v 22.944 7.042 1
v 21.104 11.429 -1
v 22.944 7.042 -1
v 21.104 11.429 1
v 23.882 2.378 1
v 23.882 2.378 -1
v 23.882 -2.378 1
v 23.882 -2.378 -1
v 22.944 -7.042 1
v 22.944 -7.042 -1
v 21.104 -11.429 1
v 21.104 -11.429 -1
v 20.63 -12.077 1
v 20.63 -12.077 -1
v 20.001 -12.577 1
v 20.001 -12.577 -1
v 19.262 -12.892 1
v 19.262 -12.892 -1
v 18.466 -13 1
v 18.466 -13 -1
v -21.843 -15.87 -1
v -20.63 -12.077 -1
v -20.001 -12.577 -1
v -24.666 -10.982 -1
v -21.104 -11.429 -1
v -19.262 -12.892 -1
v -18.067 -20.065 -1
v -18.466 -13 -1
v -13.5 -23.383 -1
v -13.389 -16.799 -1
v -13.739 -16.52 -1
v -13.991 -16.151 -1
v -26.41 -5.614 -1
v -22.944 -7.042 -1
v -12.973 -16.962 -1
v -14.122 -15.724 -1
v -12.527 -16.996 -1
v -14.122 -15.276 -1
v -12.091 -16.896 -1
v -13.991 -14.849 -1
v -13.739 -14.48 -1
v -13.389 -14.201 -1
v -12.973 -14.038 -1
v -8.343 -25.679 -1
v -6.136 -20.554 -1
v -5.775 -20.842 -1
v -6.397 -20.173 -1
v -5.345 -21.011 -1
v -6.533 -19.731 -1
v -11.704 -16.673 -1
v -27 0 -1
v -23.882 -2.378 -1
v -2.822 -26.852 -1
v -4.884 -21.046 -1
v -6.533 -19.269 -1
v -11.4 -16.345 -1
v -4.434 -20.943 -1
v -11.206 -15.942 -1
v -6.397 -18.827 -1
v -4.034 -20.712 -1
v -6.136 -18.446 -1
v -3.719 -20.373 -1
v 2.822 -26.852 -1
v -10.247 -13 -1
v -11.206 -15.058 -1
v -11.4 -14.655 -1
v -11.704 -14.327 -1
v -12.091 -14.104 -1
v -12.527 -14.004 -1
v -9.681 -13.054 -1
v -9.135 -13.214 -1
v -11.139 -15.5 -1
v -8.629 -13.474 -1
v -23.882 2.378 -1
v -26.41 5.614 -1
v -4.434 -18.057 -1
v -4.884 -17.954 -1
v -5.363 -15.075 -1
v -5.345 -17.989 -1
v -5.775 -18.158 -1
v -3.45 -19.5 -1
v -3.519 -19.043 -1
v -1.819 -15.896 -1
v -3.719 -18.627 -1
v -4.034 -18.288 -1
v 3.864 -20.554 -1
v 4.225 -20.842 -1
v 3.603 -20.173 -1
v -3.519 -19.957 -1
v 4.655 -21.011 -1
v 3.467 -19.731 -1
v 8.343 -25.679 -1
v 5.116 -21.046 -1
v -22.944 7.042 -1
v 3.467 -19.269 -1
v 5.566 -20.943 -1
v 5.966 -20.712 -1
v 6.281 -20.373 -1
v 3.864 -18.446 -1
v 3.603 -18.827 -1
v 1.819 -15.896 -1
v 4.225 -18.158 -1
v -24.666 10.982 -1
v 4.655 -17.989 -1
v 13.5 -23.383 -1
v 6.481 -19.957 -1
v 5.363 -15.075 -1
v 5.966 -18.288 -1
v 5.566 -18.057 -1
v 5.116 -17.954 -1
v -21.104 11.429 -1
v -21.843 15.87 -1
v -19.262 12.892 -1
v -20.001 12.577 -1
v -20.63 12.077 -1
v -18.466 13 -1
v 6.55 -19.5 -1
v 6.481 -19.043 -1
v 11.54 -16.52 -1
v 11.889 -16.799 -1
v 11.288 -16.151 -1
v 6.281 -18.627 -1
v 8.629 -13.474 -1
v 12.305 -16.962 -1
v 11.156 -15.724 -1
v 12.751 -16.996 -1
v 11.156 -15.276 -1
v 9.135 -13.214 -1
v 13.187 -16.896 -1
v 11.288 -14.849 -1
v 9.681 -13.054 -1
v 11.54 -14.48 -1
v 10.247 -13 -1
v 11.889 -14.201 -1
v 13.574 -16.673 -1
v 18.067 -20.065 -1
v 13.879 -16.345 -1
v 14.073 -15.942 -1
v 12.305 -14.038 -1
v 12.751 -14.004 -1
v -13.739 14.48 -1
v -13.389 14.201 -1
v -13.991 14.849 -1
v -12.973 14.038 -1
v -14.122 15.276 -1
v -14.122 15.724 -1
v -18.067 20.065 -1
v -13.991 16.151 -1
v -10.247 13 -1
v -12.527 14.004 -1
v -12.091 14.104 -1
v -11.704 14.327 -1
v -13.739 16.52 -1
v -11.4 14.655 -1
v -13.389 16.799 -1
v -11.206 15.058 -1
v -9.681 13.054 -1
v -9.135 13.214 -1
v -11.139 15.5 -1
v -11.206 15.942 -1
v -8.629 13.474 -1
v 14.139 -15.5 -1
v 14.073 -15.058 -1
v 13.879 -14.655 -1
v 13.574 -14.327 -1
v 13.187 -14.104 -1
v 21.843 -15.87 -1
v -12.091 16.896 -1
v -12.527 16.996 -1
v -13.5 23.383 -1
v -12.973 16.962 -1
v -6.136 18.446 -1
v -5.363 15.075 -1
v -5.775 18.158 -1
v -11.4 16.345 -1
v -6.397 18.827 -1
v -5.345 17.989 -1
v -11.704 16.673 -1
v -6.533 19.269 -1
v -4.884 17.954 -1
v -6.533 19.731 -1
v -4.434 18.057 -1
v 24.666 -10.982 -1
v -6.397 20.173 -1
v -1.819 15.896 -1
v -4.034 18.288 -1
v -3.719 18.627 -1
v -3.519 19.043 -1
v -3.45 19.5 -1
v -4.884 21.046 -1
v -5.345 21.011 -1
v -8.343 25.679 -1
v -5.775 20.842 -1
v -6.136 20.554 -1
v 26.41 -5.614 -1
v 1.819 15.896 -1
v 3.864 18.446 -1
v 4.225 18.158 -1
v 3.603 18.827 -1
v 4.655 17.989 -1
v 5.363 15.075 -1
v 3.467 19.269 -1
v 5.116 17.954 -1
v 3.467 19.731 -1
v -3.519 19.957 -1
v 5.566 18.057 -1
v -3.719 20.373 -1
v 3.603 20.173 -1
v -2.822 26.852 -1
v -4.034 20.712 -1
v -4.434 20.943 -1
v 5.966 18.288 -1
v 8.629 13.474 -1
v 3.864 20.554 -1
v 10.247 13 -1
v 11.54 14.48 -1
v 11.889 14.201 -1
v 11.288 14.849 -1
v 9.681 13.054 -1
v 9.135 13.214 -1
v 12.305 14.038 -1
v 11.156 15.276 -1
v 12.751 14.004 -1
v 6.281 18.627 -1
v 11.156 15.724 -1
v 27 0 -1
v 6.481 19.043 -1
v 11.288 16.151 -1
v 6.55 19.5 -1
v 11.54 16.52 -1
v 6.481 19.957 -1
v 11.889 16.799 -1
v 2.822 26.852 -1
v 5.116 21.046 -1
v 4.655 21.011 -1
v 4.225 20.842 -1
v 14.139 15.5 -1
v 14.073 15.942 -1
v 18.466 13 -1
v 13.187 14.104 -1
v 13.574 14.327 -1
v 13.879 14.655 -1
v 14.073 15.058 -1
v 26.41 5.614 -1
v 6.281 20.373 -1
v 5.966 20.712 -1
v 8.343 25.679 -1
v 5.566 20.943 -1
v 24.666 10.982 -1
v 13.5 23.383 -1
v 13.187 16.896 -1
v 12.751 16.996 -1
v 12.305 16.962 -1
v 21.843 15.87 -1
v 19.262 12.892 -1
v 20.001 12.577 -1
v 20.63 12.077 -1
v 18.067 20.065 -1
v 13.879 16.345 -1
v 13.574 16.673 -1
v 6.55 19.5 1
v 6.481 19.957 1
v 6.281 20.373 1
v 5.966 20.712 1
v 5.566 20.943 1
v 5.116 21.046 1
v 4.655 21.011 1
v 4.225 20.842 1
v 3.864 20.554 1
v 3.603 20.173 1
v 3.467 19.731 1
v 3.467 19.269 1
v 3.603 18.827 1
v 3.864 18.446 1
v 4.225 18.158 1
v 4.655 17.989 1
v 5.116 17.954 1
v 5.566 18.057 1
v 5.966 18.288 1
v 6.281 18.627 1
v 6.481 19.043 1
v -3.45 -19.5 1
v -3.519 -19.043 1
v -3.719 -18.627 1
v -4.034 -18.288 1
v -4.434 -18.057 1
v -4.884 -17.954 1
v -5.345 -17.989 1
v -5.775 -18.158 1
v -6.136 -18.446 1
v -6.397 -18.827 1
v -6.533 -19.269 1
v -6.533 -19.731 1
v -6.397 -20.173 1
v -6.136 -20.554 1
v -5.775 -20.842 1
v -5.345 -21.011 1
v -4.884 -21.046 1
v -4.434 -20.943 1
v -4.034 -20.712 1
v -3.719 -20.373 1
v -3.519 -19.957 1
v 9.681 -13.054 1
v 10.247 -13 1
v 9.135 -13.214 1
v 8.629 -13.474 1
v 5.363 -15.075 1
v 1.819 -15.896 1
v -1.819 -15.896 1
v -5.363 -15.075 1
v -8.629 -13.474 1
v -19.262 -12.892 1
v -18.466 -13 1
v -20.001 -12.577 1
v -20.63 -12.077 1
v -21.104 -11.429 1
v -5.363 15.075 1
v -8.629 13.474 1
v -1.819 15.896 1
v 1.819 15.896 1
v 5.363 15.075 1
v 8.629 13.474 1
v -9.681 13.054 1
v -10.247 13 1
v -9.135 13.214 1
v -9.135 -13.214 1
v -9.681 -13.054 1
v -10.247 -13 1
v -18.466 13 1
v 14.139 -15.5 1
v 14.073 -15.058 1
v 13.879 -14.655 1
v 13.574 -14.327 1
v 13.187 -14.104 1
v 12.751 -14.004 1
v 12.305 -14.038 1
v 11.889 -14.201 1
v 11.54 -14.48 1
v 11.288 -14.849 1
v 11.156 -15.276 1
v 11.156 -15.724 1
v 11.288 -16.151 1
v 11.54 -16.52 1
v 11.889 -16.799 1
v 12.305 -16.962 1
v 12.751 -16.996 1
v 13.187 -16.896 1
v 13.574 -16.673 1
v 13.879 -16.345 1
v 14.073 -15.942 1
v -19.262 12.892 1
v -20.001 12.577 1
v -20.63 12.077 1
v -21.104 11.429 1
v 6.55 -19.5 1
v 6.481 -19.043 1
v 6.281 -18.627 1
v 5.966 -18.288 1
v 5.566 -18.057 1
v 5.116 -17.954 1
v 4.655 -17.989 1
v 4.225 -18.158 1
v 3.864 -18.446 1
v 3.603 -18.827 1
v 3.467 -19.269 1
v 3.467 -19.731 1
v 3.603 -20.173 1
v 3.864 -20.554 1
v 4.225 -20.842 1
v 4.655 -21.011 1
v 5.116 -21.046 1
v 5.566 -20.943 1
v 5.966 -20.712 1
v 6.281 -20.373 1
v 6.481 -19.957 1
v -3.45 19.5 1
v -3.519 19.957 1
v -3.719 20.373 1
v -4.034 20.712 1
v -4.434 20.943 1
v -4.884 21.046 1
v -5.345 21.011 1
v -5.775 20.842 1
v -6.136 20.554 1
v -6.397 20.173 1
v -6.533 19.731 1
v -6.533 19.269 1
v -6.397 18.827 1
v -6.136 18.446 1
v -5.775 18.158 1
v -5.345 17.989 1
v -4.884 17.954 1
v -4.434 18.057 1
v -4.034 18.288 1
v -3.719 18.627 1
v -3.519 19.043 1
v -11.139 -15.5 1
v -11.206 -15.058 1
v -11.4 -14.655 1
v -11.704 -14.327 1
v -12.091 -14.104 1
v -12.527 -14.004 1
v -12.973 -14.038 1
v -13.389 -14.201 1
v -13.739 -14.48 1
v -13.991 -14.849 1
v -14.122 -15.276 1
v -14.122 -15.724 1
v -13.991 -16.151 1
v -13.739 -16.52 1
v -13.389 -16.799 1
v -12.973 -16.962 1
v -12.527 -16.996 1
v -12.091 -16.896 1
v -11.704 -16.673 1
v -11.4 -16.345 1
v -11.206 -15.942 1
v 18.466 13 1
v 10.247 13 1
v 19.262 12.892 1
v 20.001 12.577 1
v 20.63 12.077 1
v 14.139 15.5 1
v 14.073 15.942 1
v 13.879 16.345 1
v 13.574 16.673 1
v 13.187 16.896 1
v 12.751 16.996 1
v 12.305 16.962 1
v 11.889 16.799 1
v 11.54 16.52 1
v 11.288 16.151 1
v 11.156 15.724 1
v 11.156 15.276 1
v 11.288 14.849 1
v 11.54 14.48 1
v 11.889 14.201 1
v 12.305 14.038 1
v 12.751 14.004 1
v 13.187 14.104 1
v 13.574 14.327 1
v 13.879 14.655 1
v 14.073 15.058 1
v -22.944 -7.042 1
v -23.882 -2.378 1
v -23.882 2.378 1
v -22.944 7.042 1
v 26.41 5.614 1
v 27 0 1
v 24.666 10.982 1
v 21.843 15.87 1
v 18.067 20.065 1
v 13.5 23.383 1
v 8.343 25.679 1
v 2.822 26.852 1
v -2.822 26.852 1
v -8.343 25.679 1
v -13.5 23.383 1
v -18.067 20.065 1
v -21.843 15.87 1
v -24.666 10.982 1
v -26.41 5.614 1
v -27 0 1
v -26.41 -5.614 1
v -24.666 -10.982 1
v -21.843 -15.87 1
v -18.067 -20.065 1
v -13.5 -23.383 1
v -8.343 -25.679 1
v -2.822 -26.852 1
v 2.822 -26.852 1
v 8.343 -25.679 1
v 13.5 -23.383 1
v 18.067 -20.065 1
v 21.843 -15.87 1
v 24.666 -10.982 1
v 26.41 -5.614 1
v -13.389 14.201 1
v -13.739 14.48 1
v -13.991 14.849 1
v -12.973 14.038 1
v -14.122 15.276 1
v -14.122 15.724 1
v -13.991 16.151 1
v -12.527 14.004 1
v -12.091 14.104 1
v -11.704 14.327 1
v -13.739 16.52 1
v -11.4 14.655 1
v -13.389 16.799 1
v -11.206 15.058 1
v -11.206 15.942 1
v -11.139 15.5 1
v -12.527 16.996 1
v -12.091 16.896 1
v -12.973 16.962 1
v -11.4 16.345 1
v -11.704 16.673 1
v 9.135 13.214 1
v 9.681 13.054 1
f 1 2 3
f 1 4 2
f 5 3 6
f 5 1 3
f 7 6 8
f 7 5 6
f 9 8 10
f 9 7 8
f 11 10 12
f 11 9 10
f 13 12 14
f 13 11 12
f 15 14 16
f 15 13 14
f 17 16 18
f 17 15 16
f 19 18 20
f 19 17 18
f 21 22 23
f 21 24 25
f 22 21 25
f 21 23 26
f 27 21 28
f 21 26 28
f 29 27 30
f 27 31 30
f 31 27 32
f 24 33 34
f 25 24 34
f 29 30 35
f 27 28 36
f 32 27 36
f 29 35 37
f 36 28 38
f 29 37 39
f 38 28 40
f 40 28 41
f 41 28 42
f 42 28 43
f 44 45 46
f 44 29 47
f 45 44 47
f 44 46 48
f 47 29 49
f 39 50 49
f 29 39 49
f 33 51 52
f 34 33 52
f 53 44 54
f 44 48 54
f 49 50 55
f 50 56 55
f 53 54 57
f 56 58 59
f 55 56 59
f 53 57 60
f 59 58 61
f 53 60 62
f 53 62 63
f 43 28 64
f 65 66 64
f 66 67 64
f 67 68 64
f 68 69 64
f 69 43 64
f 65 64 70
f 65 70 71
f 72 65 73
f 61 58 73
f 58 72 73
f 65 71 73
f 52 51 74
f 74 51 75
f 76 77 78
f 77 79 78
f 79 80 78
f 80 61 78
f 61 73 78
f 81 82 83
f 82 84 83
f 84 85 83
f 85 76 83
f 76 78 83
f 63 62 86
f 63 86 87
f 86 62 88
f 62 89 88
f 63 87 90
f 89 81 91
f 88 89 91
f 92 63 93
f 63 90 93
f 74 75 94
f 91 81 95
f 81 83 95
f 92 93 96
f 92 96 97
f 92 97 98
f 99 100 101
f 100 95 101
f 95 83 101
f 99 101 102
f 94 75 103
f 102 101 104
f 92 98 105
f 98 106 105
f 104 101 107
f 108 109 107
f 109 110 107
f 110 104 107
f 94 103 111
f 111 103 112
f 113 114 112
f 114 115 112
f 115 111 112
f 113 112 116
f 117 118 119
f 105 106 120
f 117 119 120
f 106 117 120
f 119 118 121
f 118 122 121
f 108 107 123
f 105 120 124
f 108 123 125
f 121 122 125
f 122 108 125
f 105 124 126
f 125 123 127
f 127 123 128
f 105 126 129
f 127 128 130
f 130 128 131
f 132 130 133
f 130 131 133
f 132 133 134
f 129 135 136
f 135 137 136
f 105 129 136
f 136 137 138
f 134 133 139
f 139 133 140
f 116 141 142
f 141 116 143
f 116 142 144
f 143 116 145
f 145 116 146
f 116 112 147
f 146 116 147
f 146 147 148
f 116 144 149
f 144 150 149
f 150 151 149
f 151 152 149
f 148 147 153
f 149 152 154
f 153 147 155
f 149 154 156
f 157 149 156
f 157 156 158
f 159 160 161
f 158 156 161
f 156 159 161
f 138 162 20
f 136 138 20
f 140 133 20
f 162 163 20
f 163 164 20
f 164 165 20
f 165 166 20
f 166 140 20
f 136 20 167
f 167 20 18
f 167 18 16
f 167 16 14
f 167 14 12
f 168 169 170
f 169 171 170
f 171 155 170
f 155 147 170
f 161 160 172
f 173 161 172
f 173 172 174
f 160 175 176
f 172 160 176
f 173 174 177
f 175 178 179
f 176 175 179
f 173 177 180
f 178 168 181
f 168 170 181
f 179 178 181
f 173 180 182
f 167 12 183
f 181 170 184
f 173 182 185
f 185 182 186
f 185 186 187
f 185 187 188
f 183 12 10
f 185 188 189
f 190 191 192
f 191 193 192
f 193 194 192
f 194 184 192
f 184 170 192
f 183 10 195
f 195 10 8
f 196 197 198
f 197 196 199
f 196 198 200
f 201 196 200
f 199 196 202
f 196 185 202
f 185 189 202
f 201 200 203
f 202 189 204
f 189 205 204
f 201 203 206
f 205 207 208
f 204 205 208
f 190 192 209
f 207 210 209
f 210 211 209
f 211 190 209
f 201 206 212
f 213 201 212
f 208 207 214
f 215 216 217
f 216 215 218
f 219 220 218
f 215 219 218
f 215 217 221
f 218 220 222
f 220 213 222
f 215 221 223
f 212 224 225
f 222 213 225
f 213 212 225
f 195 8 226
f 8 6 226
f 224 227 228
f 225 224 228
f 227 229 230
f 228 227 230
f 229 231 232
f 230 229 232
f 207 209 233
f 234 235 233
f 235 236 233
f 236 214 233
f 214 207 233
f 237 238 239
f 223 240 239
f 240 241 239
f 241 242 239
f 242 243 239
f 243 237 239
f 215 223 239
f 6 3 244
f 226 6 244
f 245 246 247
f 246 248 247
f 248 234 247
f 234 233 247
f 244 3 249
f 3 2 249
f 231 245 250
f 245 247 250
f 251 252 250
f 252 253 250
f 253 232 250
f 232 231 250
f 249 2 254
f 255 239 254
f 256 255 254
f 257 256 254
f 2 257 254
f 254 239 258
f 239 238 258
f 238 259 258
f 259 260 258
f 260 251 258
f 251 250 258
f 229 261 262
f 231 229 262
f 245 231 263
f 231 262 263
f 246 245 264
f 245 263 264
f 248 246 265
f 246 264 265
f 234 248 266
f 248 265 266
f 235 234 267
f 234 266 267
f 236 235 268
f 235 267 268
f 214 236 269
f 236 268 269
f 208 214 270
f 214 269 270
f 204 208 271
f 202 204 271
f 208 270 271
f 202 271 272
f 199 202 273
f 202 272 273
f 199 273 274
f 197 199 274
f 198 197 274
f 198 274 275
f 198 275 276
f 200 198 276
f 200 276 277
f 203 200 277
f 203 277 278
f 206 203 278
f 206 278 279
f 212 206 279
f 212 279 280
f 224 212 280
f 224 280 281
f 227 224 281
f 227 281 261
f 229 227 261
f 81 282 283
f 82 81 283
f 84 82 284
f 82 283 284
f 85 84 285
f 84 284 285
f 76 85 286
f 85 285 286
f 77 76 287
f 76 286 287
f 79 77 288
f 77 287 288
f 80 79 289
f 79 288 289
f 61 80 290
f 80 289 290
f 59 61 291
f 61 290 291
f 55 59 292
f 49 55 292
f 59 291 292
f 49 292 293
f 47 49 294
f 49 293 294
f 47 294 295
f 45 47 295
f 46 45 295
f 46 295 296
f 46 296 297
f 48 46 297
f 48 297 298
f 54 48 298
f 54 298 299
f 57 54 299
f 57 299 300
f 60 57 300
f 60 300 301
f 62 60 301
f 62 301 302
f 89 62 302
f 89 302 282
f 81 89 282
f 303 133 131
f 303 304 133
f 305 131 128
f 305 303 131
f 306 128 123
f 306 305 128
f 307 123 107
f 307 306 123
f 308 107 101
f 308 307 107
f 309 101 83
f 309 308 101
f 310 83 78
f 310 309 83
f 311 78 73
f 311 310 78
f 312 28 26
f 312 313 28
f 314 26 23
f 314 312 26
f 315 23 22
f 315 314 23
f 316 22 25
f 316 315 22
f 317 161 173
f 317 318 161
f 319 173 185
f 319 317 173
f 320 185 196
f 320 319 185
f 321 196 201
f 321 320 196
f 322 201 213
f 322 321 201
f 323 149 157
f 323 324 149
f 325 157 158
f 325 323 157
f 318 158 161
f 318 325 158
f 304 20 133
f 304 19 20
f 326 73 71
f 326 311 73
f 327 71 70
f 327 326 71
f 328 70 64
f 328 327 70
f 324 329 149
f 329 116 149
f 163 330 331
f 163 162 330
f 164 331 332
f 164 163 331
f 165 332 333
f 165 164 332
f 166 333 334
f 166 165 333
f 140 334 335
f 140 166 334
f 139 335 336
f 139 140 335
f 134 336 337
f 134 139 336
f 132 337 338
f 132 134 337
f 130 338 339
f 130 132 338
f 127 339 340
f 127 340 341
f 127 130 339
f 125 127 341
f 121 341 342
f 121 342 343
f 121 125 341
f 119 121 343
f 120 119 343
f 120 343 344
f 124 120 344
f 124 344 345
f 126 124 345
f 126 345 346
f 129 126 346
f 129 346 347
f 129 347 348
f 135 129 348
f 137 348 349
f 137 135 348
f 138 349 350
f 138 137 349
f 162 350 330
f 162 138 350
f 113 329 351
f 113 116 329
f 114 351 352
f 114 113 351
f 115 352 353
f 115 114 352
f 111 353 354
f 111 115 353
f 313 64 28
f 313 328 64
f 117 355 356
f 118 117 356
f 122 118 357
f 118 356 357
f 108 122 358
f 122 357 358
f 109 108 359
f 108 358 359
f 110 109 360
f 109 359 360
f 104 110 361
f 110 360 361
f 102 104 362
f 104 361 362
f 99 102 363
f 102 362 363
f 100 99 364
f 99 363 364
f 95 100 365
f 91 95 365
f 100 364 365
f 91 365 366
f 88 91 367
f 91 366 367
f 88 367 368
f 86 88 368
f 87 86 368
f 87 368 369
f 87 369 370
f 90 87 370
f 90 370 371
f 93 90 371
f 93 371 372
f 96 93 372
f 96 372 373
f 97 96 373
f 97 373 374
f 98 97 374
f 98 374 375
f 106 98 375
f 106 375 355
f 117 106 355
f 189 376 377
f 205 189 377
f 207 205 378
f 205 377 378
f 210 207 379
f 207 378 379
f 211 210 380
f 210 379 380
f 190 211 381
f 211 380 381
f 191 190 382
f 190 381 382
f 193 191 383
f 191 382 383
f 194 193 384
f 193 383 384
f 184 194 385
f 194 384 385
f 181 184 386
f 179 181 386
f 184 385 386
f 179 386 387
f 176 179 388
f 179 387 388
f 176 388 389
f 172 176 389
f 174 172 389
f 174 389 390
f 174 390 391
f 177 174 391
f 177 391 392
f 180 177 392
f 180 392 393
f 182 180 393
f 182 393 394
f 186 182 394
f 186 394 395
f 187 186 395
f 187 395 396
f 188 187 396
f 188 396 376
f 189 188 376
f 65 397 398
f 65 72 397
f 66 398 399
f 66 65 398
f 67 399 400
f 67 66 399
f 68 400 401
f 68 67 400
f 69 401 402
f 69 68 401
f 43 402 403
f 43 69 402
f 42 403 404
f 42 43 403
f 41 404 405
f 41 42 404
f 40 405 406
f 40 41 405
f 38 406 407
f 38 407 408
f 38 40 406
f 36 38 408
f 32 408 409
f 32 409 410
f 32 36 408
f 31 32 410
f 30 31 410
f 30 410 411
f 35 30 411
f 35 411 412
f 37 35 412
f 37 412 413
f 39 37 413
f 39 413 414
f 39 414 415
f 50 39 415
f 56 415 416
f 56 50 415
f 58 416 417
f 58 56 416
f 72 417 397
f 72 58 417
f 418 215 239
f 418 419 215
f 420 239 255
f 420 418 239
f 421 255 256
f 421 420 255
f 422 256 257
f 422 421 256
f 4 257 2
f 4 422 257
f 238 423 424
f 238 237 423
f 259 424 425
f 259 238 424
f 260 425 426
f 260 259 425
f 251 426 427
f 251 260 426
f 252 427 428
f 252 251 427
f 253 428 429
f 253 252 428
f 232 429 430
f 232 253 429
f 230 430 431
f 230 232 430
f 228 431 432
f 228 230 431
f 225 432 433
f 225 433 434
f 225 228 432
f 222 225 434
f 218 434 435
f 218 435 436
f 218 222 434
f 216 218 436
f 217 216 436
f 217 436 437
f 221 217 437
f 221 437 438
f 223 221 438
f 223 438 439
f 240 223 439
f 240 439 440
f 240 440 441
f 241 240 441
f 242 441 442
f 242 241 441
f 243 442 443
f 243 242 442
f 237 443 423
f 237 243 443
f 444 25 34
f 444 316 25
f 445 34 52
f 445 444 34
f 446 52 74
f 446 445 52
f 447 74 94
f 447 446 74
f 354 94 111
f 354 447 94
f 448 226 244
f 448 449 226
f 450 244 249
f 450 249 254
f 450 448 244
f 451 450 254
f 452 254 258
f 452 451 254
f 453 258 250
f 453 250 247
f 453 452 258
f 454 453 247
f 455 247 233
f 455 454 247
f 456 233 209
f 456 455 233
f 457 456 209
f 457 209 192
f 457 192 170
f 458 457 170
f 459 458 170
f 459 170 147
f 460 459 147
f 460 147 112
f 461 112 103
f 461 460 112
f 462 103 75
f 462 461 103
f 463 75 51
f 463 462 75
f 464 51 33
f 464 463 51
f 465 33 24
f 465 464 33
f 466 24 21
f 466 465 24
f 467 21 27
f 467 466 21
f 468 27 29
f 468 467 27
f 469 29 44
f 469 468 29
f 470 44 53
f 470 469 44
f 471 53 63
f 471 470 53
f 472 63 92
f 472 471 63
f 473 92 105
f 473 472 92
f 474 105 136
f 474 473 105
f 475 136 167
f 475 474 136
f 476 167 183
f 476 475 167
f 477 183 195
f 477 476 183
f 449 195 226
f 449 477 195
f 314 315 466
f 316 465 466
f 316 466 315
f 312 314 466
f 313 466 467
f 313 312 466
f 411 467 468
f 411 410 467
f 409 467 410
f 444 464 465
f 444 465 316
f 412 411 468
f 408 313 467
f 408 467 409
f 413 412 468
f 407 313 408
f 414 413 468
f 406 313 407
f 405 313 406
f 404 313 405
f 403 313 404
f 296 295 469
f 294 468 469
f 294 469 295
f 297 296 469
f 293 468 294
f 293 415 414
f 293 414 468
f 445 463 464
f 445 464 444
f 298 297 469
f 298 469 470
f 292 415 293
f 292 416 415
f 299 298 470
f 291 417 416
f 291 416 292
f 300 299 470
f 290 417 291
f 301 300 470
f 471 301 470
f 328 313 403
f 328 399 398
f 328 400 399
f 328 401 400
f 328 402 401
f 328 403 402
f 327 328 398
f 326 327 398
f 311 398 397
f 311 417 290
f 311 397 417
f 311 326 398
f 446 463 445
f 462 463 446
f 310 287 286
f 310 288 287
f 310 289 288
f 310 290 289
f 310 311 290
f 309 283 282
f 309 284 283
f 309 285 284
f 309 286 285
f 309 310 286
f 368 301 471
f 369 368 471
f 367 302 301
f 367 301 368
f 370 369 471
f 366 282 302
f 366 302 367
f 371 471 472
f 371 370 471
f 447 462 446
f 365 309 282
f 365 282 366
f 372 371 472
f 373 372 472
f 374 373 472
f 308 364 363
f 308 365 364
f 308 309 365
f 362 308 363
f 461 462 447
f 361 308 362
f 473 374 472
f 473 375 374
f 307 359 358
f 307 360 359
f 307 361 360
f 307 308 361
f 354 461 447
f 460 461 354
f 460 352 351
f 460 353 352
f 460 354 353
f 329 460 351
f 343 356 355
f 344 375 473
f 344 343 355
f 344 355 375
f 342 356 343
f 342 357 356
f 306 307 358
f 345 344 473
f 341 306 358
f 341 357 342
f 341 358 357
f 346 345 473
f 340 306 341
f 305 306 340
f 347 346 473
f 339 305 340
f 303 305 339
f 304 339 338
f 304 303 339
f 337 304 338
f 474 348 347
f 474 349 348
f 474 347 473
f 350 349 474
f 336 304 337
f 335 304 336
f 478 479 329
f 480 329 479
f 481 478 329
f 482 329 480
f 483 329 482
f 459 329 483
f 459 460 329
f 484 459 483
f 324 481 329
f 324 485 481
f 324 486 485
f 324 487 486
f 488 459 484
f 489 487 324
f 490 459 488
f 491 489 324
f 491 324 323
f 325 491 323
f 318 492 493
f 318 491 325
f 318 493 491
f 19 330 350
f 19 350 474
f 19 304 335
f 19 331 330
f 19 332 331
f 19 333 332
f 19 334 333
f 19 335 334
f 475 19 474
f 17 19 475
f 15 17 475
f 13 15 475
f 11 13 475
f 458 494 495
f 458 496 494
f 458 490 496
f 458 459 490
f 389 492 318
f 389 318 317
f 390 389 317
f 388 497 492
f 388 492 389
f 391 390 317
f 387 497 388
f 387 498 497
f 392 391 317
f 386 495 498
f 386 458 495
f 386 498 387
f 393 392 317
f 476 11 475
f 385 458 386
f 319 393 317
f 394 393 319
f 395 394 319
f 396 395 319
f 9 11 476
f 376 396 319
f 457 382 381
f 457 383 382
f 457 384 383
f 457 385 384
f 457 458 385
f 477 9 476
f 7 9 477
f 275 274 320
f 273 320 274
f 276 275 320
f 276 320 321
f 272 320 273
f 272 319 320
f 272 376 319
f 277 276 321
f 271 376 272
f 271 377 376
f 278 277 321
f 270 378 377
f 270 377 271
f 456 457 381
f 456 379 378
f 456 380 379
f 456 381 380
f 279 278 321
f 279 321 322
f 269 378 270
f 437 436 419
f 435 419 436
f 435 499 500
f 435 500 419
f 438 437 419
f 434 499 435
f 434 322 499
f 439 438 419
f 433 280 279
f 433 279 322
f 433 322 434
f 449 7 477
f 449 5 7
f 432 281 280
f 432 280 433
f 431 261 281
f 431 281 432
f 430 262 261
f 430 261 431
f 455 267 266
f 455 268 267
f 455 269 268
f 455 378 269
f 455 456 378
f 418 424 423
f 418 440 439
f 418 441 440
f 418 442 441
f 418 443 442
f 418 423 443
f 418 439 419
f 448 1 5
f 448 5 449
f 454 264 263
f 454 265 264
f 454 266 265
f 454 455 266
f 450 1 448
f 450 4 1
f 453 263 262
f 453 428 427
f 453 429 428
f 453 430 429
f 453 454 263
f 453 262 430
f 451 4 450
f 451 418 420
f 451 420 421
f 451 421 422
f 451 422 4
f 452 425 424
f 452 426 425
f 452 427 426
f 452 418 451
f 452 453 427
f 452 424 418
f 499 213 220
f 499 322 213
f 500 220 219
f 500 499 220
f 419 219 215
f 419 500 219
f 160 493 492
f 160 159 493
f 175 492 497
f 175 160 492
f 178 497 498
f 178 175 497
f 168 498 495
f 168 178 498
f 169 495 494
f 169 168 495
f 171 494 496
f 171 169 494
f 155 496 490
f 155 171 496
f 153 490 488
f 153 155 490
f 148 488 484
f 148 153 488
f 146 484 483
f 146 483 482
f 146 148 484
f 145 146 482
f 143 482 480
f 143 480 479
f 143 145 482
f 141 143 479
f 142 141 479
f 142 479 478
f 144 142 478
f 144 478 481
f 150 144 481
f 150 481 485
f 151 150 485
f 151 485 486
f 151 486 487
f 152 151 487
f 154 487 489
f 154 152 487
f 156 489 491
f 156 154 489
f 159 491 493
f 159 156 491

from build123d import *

# Parameters (mm, degrees)
SKETCH_1_R          = 27
SKETCH_1_R_2        = 1.5
EXTRUDE_1_DEPTH     = 1
FILLET_1_R          = 3
SKETCH_2_R          = 1.55
CUT_EXTRUDE_1_DEPTH = 3


with BuildPart() as part:
    # 草图1 → 凸台-拉伸1 (new body, symmetric)
    with BuildSketch(Plane.XY):
        Circle(SKETCH_1_R)
        with Locations((-12.63922466, 15.5)):
            Circle(SKETCH_1_R_2, mode=Mode.SUBTRACT)
        with Locations((12.63922466, 15.5)):
            Circle(SKETCH_1_R_2, mode=Mode.SUBTRACT)
        with Locations((-12.63922466, -15.5)):
            Circle(SKETCH_1_R_2, mode=Mode.SUBTRACT)
        with Locations((12.63922466, -15.5)):
            Circle(SKETCH_1_R_2, mode=Mode.SUBTRACT)
        with BuildLine():
            Line((-20.174241002, 13), (-9.327379053, 13))
            ThreePointArc((-9.327379053, 13), (0, 16), (9.327379053, 13))
            Line((9.327379053, 13), (20.174241002, 13))
            ThreePointArc((20.174241002, 13), (24, 0), (20.174241002, -13))
            Line((20.174241002, -13), (9.327379053, -13))
            ThreePointArc((9.327379053, -13), (0, -16), (-9.327379053, -13))
            Line((-9.327379053, -13), (-20.174241002, -13))
            ThreePointArc((-20.174241002, -13), (-24, 0), (-20.174241002, 13))
        make_face(mode=Mode.SUBTRACT)
    extrude(amount=EXTRUDE_1_DEPTH, both=True)

    # 圆角1
    fillet_1_edges = [part.edges().sort_by_distance(p)[0] for p in [
        (-20.174241002, 13, 0),
        (-20.174241002, -13, 0),
        (-9.327379053, -13, 0),
        (9.327379053, -13, 0),
        (20.174241002, -13, 0),
        (20.174241002, 13, 0),
        (9.327379053, 13, 0),
        (-9.327379053, 13, 0),
    ]]
    fillet(fillet_1_edges, radius=FILLET_1_R)

    # 草图2 → 切除-拉伸1 (cut, through all)
    with BuildSketch(Plane.XY.offset(1)):
        with Locations((-5, 19.5)):
            Circle(SKETCH_2_R)
        with Locations((5, 19.5)):
            Circle(SKETCH_2_R)
        with Locations((-5, -19.5)):
            Circle(SKETCH_2_R)
        with Locations((5, -19.5)):
            Circle(SKETCH_2_R)
    extrude(amount=-CUT_EXTRUDE_1_DEPTH, mode=Mode.SUBTRACT)


solid = part.part
